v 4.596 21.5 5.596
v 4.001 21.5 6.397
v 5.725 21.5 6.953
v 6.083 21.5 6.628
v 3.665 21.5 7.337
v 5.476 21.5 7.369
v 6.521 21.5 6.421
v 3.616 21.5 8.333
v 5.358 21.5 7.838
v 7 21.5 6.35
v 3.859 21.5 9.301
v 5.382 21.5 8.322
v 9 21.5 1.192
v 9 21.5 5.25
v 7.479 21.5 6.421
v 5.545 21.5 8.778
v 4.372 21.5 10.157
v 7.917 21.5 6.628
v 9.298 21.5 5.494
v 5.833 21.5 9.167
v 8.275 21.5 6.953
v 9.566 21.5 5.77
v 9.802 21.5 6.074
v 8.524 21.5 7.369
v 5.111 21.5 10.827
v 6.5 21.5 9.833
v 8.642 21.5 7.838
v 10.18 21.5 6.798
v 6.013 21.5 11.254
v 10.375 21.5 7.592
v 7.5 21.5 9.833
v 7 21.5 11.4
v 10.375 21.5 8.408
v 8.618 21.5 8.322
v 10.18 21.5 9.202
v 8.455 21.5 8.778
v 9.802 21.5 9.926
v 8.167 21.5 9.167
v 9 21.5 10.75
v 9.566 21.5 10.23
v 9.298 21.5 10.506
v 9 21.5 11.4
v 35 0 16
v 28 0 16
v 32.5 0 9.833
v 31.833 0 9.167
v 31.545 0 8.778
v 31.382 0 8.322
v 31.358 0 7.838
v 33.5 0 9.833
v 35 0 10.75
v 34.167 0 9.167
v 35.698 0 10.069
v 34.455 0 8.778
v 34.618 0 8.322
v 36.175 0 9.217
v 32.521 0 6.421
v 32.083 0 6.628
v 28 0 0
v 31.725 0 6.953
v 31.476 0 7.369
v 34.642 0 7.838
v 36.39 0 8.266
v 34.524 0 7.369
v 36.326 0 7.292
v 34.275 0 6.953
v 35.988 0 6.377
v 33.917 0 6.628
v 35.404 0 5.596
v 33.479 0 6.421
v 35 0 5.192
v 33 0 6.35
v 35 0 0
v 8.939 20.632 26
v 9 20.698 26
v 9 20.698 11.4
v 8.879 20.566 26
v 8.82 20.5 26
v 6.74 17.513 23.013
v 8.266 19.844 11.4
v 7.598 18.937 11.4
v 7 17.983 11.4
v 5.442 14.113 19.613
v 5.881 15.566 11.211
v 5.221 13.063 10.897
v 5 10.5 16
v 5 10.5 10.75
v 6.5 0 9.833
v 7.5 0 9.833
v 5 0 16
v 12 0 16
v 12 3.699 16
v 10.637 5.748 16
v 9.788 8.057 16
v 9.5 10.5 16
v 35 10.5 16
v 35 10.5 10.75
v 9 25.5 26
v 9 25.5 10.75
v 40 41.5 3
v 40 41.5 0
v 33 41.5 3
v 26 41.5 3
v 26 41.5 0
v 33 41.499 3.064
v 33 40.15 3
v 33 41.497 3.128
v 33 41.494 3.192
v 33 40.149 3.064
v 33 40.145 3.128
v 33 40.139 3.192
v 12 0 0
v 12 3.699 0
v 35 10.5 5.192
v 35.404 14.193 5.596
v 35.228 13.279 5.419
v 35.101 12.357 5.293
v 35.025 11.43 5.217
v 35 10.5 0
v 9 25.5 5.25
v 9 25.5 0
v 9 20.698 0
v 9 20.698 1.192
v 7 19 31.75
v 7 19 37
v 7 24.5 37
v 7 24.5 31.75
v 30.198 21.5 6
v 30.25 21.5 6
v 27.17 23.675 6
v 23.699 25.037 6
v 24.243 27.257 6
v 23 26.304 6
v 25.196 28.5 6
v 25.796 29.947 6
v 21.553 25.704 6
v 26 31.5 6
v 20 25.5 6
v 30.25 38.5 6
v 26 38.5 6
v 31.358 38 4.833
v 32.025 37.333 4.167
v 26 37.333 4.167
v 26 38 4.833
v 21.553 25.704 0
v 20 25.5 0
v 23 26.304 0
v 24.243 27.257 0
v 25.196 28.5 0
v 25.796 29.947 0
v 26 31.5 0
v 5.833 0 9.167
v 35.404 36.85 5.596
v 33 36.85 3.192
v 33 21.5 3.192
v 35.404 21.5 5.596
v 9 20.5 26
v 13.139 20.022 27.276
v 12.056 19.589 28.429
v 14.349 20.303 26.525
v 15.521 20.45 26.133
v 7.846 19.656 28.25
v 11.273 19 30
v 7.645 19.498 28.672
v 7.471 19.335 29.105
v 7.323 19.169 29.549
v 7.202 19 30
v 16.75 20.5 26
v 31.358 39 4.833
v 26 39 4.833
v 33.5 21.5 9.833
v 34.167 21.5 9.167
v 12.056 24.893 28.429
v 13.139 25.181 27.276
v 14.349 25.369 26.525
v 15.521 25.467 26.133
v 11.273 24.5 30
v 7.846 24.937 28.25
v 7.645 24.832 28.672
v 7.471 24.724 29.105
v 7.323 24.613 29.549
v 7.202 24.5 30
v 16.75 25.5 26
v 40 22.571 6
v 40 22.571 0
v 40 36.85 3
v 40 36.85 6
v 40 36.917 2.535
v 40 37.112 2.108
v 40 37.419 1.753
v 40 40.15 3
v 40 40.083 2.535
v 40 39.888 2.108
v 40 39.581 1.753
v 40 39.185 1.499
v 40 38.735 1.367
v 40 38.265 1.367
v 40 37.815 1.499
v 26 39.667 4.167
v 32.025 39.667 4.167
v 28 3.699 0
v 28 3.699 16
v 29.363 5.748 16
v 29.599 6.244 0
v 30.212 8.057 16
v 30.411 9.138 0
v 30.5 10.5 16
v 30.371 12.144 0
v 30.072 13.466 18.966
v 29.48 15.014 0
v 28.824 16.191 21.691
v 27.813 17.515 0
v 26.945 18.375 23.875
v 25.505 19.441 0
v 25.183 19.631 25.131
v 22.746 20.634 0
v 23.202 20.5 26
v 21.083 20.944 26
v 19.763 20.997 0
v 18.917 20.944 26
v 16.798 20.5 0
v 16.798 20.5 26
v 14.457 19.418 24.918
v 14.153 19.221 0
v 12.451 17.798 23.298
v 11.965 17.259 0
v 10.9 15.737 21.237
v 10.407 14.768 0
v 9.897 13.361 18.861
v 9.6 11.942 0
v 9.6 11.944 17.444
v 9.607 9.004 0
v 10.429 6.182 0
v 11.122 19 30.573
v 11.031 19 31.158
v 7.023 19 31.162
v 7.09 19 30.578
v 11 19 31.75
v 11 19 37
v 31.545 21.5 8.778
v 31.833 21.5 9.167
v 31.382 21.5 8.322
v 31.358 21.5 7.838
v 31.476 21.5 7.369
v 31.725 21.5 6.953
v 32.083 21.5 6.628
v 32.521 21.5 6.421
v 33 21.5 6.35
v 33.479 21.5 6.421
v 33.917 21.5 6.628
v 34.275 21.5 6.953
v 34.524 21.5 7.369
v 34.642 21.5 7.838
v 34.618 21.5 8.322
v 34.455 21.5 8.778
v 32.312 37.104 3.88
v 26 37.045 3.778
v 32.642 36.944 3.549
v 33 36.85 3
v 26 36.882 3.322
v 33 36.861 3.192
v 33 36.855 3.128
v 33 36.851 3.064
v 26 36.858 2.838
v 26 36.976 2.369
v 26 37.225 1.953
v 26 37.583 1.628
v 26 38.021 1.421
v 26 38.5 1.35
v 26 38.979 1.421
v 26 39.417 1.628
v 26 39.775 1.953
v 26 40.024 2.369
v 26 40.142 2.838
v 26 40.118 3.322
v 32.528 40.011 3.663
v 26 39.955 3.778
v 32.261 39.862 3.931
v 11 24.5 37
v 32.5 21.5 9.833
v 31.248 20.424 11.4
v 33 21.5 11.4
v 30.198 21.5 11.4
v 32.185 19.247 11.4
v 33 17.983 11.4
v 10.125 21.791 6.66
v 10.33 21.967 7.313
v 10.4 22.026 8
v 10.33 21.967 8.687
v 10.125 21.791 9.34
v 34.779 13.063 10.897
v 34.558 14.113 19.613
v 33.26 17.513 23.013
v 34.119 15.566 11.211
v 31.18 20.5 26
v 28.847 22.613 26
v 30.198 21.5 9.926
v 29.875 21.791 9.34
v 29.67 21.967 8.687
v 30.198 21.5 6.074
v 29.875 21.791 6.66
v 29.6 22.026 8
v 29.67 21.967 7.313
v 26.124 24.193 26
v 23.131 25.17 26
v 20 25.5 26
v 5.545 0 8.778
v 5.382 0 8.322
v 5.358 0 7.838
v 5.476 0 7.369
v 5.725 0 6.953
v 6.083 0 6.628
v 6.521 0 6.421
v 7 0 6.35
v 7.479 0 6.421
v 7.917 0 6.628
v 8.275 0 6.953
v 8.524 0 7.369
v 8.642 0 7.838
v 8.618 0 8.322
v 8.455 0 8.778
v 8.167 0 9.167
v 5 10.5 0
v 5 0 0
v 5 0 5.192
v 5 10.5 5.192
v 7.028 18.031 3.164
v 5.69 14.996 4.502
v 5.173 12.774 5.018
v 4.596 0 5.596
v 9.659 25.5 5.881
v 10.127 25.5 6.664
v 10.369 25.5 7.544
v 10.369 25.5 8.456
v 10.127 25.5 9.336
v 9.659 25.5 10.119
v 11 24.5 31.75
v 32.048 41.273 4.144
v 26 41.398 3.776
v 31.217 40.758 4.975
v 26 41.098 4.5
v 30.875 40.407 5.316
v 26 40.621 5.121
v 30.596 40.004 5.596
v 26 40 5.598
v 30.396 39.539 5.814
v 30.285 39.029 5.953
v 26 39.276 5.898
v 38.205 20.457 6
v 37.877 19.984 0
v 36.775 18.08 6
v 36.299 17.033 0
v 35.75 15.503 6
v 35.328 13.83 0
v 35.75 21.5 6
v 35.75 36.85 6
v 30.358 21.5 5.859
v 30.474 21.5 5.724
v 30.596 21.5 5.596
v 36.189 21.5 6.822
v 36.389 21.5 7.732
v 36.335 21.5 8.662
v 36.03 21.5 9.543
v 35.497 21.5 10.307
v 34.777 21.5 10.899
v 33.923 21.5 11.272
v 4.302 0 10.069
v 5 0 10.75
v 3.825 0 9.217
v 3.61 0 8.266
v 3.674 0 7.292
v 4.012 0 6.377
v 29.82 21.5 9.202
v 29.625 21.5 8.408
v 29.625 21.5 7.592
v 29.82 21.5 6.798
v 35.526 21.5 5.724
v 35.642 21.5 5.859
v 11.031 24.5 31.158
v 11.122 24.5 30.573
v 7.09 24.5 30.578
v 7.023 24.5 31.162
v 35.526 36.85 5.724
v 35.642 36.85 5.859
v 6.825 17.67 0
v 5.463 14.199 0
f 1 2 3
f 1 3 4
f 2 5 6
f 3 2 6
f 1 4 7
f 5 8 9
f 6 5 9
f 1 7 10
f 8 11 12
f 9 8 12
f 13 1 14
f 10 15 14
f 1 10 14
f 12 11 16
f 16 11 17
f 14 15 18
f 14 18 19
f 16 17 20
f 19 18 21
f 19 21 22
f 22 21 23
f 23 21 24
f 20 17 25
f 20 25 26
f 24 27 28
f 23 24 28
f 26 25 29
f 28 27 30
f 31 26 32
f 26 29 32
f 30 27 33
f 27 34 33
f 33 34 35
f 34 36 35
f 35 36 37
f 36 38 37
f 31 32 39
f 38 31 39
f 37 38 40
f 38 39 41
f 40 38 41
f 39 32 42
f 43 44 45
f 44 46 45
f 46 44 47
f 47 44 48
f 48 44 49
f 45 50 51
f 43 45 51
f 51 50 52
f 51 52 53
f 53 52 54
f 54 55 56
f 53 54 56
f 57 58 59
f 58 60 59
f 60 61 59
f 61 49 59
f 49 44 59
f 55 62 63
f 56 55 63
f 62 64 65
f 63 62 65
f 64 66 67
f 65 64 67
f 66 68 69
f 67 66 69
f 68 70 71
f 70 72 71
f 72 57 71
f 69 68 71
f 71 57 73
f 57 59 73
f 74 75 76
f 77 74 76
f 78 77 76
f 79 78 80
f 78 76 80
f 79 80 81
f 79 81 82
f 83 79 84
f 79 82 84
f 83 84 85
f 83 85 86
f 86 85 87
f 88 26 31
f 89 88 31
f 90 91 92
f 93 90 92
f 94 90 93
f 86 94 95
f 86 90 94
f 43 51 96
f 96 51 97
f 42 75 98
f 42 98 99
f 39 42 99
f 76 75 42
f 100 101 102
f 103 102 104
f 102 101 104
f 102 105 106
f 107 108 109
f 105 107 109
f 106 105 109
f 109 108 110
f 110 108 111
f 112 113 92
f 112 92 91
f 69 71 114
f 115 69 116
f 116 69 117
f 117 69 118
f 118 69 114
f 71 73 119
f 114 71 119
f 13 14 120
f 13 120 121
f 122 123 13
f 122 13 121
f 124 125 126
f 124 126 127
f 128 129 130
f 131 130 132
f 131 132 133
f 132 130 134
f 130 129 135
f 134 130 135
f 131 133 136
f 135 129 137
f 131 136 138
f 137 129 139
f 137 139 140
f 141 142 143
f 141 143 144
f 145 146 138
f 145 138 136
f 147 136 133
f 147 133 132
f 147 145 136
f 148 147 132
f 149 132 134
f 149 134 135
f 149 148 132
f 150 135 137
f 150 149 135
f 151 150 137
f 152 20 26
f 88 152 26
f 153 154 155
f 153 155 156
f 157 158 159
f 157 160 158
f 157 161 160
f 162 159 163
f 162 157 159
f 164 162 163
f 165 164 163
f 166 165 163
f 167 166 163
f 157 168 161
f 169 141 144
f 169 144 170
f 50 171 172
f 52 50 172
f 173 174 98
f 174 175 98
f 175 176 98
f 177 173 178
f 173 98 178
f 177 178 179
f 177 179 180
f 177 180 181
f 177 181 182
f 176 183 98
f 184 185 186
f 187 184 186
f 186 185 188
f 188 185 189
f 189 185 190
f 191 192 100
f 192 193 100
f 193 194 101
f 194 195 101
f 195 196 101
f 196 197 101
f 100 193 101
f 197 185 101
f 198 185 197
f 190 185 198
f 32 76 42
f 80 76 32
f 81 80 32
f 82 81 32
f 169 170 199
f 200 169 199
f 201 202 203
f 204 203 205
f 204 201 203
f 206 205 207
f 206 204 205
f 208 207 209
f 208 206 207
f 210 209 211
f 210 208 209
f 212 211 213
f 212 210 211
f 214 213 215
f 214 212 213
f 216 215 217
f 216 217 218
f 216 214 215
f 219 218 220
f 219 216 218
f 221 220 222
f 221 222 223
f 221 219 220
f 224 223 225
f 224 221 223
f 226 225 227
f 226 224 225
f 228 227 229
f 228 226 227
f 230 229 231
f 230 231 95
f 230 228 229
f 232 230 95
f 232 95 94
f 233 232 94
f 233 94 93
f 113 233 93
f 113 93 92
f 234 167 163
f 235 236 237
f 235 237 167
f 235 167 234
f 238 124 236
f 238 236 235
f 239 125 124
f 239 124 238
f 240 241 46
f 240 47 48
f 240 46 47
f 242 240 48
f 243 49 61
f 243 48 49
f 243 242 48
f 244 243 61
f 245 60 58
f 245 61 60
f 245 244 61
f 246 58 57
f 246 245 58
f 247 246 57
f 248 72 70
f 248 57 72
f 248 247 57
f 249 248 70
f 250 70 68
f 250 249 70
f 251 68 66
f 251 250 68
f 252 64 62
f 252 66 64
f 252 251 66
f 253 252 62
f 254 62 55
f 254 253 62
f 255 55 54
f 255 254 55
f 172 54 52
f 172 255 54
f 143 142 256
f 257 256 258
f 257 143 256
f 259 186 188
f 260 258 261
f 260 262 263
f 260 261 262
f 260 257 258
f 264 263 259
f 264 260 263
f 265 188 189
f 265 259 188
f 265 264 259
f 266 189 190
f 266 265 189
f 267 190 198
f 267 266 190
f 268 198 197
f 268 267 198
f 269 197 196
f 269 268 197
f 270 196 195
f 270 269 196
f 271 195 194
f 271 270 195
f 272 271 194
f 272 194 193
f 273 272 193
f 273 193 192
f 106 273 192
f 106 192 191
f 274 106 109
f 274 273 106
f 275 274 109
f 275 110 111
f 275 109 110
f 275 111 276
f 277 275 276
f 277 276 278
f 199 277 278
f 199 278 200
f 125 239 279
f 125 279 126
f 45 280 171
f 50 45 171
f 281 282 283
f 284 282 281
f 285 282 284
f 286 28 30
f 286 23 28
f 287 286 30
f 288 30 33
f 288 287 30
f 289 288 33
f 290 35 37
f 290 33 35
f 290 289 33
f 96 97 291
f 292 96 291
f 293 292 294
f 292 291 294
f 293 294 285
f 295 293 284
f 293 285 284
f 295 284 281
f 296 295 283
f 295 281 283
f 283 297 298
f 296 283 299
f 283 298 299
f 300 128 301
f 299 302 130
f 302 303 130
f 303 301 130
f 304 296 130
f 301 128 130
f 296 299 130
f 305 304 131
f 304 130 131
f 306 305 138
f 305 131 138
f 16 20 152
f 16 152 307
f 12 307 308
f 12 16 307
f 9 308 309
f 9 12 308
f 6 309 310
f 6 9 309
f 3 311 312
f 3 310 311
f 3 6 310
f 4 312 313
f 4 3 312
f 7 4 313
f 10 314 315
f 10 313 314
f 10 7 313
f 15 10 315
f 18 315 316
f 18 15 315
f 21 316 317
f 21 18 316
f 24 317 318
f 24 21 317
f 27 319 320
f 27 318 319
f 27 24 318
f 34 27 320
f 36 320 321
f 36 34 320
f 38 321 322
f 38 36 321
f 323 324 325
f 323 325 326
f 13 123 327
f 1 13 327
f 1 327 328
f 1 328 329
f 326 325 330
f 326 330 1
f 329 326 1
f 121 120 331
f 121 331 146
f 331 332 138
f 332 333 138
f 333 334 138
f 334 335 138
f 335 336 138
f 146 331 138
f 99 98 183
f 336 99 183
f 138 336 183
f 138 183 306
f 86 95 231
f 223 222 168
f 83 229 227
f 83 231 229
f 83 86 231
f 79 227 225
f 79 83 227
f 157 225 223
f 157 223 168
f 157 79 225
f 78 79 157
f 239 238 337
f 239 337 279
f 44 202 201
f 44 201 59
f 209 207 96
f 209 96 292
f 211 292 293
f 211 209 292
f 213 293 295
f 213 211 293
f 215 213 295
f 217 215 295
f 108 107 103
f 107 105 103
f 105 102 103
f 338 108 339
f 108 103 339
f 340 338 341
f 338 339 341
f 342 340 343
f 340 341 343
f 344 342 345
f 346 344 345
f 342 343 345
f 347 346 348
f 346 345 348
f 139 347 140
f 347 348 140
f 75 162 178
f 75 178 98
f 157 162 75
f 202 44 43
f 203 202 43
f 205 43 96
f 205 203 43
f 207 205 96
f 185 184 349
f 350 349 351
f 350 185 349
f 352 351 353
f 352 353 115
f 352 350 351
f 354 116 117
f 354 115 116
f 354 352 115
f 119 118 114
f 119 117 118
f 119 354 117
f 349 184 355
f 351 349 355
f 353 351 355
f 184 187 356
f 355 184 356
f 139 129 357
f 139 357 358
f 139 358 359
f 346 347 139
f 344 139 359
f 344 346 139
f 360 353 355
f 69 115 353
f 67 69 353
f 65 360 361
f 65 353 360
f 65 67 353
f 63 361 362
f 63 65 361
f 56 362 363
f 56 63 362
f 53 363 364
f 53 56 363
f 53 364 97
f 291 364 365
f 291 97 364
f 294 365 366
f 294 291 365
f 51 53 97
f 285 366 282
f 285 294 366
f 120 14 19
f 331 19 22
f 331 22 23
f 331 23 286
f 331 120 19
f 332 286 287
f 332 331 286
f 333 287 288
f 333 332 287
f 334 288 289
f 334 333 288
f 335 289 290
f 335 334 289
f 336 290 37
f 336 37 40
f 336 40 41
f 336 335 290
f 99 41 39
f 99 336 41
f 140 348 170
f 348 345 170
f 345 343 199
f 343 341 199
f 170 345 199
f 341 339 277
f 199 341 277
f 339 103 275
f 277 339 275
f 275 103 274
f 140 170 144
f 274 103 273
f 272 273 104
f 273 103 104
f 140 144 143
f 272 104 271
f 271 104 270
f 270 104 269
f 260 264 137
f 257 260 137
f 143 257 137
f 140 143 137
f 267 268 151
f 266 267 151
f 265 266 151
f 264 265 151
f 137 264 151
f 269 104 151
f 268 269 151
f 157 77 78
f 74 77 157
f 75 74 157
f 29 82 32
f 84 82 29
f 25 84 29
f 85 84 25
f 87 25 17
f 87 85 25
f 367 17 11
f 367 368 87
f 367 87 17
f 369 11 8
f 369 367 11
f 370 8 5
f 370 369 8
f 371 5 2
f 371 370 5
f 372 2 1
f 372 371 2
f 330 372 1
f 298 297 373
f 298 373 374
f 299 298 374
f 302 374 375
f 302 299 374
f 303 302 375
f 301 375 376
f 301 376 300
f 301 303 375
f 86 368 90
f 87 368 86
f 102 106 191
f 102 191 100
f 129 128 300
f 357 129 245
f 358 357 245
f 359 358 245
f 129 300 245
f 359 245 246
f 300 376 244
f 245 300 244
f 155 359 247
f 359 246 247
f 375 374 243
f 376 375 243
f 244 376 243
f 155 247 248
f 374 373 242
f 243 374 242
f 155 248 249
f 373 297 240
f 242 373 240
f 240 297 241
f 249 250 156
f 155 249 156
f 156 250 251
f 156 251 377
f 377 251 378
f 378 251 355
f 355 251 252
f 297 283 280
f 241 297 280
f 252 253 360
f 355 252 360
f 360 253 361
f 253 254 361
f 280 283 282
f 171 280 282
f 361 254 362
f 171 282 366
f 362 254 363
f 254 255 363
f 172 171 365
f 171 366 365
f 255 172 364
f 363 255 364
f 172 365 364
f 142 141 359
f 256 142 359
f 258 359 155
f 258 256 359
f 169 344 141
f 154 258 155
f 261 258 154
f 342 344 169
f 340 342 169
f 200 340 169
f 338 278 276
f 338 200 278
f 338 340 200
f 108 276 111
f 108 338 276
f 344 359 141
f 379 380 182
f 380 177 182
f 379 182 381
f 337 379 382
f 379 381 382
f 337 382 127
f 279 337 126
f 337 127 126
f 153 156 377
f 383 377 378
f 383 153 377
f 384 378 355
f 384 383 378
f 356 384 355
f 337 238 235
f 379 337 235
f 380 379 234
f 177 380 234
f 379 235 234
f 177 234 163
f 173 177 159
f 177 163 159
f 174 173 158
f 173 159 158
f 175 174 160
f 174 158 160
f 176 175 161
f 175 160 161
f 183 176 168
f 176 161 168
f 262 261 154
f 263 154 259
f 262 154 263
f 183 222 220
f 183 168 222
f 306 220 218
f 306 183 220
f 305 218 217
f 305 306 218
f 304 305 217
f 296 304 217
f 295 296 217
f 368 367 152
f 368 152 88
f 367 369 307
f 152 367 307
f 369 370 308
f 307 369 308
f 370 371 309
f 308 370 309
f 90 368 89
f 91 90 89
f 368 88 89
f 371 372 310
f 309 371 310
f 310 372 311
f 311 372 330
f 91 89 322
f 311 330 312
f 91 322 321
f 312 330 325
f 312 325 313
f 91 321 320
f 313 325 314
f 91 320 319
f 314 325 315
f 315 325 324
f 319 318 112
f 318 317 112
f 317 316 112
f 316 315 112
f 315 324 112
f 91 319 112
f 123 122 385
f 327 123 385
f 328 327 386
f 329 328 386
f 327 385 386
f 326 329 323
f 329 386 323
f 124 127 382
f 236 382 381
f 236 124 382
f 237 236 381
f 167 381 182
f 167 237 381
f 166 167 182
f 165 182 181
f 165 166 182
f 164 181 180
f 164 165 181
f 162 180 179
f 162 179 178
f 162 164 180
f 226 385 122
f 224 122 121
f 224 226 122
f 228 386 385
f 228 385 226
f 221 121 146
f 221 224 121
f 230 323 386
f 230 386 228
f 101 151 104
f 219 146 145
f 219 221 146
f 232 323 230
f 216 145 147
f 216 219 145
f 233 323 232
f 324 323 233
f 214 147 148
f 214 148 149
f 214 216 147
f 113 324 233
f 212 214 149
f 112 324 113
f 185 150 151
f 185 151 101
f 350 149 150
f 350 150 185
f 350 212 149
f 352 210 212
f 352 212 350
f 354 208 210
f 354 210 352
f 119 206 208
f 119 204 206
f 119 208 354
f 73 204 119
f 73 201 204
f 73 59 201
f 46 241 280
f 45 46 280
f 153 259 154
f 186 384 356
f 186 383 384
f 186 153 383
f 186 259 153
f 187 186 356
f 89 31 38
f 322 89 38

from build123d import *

# Parameters (mm, degrees)
PAD003_DEPTH    = 6.5
SKETCH016_R     = 10.5
POCKET005_DEPTH = 37.001
POCKET006_DEPTH = 20.001
SKETCH018_R     = 3.4
POCKET007_DEPTH = 20
PAD001_DEPTH    = 21.5
PAD002_DEPTH    = 6
PAD_DEPTH       = 26
SKETCH010_R     = 3.4
POCKET_DEPTH    = 20
POCKET001_DEPTH = 26.001
POCKET002_DEPTH = 41.501
POCKET003_DEPTH = 40.001
POCKET004_DEPTH = 7


with BuildPart() as body006:
    # Sketch015 → Pad003 (new body)
    with BuildSketch(Plane.XZ.offset(-19)):
        with BuildLine():
            Line((7.845523, 28.25), (9, 26))
            Line((9, 26), (9, 0))
            Line((9, 0), (20, 0))
            Line((20, 0), (20, 26))
            Line((16.75, 26), (20, 26))
            ThreePointArc((11, 31.75), (12.684136, 27.684136), (16.75, 26))
            Line((11, 31.75), (11, 37))
            Line((11, 37), (7, 37))
            Line((7, 37), (7, 31.75))
            ThreePointArc((7, 31.75), (7.214378, 29.949659), (7.845523, 28.25))
        make_face()
    extrude(amount=-PAD003_DEPTH)

    # Sketch016 → Pocket005 (cut, through all)
    with BuildSketch(Plane.XY):
        with Locations((20, 10.5)):
            Circle(SKETCH016_R)
    extrude(amount=POCKET005_DEPTH, mode=Mode.SUBTRACT)

    # Sketch017 → Pocket006 (cut, through all)
    with BuildSketch(Plane.YZ):
        Polygon((20.5, 0), (20.5, 26), (19, 30), (19, 0), align=None)
        Polygon((25.5, 26), (24.5, 30), (24.5, 37), (25.5, 37), align=None)
    extrude(amount=POCKET006_DEPTH, mode=Mode.SUBTRACT)

    # Sketch018 → Pocket007 (cut)
    with BuildSketch(Plane.XZ.offset(-41.5)):
        with Locations((7, 8)):
            Circle(SKETCH018_R)
        with BuildLine():
            ThreePointArc((35.404163, 5.595837), (33, 11.4), (30.595837, 5.595837))
            Line((30.595837, 5.595837), (33, 3.191674))
            Line((33, 3.191674), (35.404163, 5.595837))
        make_face()
    extrude(amount=POCKET007_DEPTH, mode=Mode.SUBTRACT)


with BuildPart() as boltpairboss:
    # Sketch006 → Pad001 (new body)
    with BuildSketch(Plane.XZ):
        with BuildLine():
            ThreePointArc((7, 11.4), (3.85881, 9.301124), (4.595837, 5.595837))
            Line((10.191674, 0), (4.595837, 5.595837))
            Line((10.191674, 0), (29.808326, 0))
            Line((29.808326, 0), (35.404163, 5.595837))
            ThreePointArc((35.404163, 5.595837), (36.14119, 9.301124), (33, 11.4))
            Line((33, 11.4), (7, 11.4))
        make_face()
    extrude(amount=-PAD001_DEPTH)


with BuildPart() as sideboltboss:
    # Sketch007 → Pad002 (new body)
    with BuildSketch(Plane.XY):
        with BuildLine():
            Line((5, 0), (5, 10.5))
            ThreePointArc((20, 25.5), (9.393398, 21.106602), (5, 10.5))
            ThreePointArc((20, 25.5), (24.242641, 27.257359), (26, 31.5))
            Line((26, 41.5), (26, 31.5))
            Line((40, 41.5), (26, 41.5))
            Line((40, 22.571068), (40, 41.5))
            ThreePointArc((40, 22.571068), (36.299458, 17.032815), (35, 10.5))
            Line((35, 0), (35, 10.5))
            Line((5, 0), (35, 0))
        make_face()
    extrude(amount=PAD002_DEPTH)


with BuildPart() as fusion001:
    # Sketch → Pad (new body)
    with BuildSketch(Plane.XY):
        with BuildLine():
            ThreePointArc((35, 10.5), (20, 25.5), (5, 10.5))
            Line((5, 0), (5, 10.5))
            Line((5, 0), (35, 0))
            Line((35, 0), (35, 10.5))
        make_face()
    extrude(amount=PAD_DEPTH)

    # Fusion: union BoltPairBoss, SideBoltBoss
    add(boltpairboss.part)
    add(sideboltboss.part)

    # Sketch010 → Pocket (cut)
    with BuildSketch(Plane.XZ.offset(-41.5)):
        with Locations((7, 8)):
            Circle(SKETCH010_R)
        with BuildLine():
            ThreePointArc((35.404163, 5.595837), (33, 11.4), (30.595837, 5.595837))
            Line((30.595837, 5.595837), (33, 3.191674))
            Line((33, 3.191674), (35.404163, 5.595837))
        make_face()
    extrude(amount=POCKET_DEPTH, mode=Mode.SUBTRACT)

    # Sketch011 → Pocket001 (cut, through all)
    with BuildSketch(Plane.XY):
        with BuildLine():
            ThreePointArc((28, 3.699265), (20, 21), (12, 3.699265))
            Line((12, 3.699265), (12, 0))
            Line((12, 0), (28, 0))
            Line((28, 3.699265), (28, 0))
        make_face()
    extrude(amount=POCKET001_DEPTH, mode=Mode.SUBTRACT)

    # Sketch012 → Pocket002 (cut, through all)
    with BuildSketch(Plane.XZ.offset(-41.5)):
        with BuildLine():
            ThreePointArc((5.833274, 9.166726), (7, 6.35), (8.166726, 9.166726))
            Line((7.5, 9.833452), (8.166726, 9.166726))
            Line((6.5, 9.833452), (7.5, 9.833452))
            Line((5.833274, 9.166726), (6.5, 9.833452))
        make_face()
        with BuildLine():
            ThreePointArc((31.833274, 9.166726), (33, 6.35), (34.166726, 9.166726))
            Line((33.5, 9.833452), (34.166726, 9.166726))
            Line((32.5, 9.833452), (33.5, 9.833452))
            Line((31.833274, 9.166726), (32.5, 9.833452))
        make_face()
    extrude(amount=POCKET002_DEPTH, mode=Mode.SUBTRACT)

    # Sketch013 → Pocket003 (cut, through all)
    with BuildSketch(Plane.YZ):
        Polygon((0, 16), (10.5, 16), (20.5, 26), (0, 26), align=None)
        with BuildLine():
            ThreePointArc((37.333274, 4.166726), (38.5, 1.35), (39.666726, 4.166726))
            Line((39, 4.833452), (39.666726, 4.166726))
            Line((38, 4.833452), (39, 4.833452))
            Line((37.333274, 4.166726), (38, 4.833452))
        make_face()
        with BuildLine():
            ThreePointArc((41.5, 3), (40.62132, 5.12132), (38.5, 6))
            Line((35.5, 6), (38.5, 6))
            Line((35.5, 9), (35.5, 6))
            Line((44.5, 9), (35.5, 9))
            Line((44.5, 0), (44.5, 9))
            Line((41.5, 0), (44.5, 0))
            Line((41.5, 3), (41.5, 0))
        make_face()
    extrude(amount=POCKET003_DEPTH, mode=Mode.SUBTRACT)

    # Sketch014 → Pocket004 (cut)
    with BuildSketch(Plane.YZ.offset(40)):
        Polygon((38.5, 8), (43.5, 8), (43.5, 3), (38.5, 3), (36.85, 3), (36.85, 8), align=None)
    extrude(amount=-POCKET004_DEPTH, mode=Mode.SUBTRACT)

    # Fusion001: union Body006
    add(body006.part)


solid = fusion001.part
